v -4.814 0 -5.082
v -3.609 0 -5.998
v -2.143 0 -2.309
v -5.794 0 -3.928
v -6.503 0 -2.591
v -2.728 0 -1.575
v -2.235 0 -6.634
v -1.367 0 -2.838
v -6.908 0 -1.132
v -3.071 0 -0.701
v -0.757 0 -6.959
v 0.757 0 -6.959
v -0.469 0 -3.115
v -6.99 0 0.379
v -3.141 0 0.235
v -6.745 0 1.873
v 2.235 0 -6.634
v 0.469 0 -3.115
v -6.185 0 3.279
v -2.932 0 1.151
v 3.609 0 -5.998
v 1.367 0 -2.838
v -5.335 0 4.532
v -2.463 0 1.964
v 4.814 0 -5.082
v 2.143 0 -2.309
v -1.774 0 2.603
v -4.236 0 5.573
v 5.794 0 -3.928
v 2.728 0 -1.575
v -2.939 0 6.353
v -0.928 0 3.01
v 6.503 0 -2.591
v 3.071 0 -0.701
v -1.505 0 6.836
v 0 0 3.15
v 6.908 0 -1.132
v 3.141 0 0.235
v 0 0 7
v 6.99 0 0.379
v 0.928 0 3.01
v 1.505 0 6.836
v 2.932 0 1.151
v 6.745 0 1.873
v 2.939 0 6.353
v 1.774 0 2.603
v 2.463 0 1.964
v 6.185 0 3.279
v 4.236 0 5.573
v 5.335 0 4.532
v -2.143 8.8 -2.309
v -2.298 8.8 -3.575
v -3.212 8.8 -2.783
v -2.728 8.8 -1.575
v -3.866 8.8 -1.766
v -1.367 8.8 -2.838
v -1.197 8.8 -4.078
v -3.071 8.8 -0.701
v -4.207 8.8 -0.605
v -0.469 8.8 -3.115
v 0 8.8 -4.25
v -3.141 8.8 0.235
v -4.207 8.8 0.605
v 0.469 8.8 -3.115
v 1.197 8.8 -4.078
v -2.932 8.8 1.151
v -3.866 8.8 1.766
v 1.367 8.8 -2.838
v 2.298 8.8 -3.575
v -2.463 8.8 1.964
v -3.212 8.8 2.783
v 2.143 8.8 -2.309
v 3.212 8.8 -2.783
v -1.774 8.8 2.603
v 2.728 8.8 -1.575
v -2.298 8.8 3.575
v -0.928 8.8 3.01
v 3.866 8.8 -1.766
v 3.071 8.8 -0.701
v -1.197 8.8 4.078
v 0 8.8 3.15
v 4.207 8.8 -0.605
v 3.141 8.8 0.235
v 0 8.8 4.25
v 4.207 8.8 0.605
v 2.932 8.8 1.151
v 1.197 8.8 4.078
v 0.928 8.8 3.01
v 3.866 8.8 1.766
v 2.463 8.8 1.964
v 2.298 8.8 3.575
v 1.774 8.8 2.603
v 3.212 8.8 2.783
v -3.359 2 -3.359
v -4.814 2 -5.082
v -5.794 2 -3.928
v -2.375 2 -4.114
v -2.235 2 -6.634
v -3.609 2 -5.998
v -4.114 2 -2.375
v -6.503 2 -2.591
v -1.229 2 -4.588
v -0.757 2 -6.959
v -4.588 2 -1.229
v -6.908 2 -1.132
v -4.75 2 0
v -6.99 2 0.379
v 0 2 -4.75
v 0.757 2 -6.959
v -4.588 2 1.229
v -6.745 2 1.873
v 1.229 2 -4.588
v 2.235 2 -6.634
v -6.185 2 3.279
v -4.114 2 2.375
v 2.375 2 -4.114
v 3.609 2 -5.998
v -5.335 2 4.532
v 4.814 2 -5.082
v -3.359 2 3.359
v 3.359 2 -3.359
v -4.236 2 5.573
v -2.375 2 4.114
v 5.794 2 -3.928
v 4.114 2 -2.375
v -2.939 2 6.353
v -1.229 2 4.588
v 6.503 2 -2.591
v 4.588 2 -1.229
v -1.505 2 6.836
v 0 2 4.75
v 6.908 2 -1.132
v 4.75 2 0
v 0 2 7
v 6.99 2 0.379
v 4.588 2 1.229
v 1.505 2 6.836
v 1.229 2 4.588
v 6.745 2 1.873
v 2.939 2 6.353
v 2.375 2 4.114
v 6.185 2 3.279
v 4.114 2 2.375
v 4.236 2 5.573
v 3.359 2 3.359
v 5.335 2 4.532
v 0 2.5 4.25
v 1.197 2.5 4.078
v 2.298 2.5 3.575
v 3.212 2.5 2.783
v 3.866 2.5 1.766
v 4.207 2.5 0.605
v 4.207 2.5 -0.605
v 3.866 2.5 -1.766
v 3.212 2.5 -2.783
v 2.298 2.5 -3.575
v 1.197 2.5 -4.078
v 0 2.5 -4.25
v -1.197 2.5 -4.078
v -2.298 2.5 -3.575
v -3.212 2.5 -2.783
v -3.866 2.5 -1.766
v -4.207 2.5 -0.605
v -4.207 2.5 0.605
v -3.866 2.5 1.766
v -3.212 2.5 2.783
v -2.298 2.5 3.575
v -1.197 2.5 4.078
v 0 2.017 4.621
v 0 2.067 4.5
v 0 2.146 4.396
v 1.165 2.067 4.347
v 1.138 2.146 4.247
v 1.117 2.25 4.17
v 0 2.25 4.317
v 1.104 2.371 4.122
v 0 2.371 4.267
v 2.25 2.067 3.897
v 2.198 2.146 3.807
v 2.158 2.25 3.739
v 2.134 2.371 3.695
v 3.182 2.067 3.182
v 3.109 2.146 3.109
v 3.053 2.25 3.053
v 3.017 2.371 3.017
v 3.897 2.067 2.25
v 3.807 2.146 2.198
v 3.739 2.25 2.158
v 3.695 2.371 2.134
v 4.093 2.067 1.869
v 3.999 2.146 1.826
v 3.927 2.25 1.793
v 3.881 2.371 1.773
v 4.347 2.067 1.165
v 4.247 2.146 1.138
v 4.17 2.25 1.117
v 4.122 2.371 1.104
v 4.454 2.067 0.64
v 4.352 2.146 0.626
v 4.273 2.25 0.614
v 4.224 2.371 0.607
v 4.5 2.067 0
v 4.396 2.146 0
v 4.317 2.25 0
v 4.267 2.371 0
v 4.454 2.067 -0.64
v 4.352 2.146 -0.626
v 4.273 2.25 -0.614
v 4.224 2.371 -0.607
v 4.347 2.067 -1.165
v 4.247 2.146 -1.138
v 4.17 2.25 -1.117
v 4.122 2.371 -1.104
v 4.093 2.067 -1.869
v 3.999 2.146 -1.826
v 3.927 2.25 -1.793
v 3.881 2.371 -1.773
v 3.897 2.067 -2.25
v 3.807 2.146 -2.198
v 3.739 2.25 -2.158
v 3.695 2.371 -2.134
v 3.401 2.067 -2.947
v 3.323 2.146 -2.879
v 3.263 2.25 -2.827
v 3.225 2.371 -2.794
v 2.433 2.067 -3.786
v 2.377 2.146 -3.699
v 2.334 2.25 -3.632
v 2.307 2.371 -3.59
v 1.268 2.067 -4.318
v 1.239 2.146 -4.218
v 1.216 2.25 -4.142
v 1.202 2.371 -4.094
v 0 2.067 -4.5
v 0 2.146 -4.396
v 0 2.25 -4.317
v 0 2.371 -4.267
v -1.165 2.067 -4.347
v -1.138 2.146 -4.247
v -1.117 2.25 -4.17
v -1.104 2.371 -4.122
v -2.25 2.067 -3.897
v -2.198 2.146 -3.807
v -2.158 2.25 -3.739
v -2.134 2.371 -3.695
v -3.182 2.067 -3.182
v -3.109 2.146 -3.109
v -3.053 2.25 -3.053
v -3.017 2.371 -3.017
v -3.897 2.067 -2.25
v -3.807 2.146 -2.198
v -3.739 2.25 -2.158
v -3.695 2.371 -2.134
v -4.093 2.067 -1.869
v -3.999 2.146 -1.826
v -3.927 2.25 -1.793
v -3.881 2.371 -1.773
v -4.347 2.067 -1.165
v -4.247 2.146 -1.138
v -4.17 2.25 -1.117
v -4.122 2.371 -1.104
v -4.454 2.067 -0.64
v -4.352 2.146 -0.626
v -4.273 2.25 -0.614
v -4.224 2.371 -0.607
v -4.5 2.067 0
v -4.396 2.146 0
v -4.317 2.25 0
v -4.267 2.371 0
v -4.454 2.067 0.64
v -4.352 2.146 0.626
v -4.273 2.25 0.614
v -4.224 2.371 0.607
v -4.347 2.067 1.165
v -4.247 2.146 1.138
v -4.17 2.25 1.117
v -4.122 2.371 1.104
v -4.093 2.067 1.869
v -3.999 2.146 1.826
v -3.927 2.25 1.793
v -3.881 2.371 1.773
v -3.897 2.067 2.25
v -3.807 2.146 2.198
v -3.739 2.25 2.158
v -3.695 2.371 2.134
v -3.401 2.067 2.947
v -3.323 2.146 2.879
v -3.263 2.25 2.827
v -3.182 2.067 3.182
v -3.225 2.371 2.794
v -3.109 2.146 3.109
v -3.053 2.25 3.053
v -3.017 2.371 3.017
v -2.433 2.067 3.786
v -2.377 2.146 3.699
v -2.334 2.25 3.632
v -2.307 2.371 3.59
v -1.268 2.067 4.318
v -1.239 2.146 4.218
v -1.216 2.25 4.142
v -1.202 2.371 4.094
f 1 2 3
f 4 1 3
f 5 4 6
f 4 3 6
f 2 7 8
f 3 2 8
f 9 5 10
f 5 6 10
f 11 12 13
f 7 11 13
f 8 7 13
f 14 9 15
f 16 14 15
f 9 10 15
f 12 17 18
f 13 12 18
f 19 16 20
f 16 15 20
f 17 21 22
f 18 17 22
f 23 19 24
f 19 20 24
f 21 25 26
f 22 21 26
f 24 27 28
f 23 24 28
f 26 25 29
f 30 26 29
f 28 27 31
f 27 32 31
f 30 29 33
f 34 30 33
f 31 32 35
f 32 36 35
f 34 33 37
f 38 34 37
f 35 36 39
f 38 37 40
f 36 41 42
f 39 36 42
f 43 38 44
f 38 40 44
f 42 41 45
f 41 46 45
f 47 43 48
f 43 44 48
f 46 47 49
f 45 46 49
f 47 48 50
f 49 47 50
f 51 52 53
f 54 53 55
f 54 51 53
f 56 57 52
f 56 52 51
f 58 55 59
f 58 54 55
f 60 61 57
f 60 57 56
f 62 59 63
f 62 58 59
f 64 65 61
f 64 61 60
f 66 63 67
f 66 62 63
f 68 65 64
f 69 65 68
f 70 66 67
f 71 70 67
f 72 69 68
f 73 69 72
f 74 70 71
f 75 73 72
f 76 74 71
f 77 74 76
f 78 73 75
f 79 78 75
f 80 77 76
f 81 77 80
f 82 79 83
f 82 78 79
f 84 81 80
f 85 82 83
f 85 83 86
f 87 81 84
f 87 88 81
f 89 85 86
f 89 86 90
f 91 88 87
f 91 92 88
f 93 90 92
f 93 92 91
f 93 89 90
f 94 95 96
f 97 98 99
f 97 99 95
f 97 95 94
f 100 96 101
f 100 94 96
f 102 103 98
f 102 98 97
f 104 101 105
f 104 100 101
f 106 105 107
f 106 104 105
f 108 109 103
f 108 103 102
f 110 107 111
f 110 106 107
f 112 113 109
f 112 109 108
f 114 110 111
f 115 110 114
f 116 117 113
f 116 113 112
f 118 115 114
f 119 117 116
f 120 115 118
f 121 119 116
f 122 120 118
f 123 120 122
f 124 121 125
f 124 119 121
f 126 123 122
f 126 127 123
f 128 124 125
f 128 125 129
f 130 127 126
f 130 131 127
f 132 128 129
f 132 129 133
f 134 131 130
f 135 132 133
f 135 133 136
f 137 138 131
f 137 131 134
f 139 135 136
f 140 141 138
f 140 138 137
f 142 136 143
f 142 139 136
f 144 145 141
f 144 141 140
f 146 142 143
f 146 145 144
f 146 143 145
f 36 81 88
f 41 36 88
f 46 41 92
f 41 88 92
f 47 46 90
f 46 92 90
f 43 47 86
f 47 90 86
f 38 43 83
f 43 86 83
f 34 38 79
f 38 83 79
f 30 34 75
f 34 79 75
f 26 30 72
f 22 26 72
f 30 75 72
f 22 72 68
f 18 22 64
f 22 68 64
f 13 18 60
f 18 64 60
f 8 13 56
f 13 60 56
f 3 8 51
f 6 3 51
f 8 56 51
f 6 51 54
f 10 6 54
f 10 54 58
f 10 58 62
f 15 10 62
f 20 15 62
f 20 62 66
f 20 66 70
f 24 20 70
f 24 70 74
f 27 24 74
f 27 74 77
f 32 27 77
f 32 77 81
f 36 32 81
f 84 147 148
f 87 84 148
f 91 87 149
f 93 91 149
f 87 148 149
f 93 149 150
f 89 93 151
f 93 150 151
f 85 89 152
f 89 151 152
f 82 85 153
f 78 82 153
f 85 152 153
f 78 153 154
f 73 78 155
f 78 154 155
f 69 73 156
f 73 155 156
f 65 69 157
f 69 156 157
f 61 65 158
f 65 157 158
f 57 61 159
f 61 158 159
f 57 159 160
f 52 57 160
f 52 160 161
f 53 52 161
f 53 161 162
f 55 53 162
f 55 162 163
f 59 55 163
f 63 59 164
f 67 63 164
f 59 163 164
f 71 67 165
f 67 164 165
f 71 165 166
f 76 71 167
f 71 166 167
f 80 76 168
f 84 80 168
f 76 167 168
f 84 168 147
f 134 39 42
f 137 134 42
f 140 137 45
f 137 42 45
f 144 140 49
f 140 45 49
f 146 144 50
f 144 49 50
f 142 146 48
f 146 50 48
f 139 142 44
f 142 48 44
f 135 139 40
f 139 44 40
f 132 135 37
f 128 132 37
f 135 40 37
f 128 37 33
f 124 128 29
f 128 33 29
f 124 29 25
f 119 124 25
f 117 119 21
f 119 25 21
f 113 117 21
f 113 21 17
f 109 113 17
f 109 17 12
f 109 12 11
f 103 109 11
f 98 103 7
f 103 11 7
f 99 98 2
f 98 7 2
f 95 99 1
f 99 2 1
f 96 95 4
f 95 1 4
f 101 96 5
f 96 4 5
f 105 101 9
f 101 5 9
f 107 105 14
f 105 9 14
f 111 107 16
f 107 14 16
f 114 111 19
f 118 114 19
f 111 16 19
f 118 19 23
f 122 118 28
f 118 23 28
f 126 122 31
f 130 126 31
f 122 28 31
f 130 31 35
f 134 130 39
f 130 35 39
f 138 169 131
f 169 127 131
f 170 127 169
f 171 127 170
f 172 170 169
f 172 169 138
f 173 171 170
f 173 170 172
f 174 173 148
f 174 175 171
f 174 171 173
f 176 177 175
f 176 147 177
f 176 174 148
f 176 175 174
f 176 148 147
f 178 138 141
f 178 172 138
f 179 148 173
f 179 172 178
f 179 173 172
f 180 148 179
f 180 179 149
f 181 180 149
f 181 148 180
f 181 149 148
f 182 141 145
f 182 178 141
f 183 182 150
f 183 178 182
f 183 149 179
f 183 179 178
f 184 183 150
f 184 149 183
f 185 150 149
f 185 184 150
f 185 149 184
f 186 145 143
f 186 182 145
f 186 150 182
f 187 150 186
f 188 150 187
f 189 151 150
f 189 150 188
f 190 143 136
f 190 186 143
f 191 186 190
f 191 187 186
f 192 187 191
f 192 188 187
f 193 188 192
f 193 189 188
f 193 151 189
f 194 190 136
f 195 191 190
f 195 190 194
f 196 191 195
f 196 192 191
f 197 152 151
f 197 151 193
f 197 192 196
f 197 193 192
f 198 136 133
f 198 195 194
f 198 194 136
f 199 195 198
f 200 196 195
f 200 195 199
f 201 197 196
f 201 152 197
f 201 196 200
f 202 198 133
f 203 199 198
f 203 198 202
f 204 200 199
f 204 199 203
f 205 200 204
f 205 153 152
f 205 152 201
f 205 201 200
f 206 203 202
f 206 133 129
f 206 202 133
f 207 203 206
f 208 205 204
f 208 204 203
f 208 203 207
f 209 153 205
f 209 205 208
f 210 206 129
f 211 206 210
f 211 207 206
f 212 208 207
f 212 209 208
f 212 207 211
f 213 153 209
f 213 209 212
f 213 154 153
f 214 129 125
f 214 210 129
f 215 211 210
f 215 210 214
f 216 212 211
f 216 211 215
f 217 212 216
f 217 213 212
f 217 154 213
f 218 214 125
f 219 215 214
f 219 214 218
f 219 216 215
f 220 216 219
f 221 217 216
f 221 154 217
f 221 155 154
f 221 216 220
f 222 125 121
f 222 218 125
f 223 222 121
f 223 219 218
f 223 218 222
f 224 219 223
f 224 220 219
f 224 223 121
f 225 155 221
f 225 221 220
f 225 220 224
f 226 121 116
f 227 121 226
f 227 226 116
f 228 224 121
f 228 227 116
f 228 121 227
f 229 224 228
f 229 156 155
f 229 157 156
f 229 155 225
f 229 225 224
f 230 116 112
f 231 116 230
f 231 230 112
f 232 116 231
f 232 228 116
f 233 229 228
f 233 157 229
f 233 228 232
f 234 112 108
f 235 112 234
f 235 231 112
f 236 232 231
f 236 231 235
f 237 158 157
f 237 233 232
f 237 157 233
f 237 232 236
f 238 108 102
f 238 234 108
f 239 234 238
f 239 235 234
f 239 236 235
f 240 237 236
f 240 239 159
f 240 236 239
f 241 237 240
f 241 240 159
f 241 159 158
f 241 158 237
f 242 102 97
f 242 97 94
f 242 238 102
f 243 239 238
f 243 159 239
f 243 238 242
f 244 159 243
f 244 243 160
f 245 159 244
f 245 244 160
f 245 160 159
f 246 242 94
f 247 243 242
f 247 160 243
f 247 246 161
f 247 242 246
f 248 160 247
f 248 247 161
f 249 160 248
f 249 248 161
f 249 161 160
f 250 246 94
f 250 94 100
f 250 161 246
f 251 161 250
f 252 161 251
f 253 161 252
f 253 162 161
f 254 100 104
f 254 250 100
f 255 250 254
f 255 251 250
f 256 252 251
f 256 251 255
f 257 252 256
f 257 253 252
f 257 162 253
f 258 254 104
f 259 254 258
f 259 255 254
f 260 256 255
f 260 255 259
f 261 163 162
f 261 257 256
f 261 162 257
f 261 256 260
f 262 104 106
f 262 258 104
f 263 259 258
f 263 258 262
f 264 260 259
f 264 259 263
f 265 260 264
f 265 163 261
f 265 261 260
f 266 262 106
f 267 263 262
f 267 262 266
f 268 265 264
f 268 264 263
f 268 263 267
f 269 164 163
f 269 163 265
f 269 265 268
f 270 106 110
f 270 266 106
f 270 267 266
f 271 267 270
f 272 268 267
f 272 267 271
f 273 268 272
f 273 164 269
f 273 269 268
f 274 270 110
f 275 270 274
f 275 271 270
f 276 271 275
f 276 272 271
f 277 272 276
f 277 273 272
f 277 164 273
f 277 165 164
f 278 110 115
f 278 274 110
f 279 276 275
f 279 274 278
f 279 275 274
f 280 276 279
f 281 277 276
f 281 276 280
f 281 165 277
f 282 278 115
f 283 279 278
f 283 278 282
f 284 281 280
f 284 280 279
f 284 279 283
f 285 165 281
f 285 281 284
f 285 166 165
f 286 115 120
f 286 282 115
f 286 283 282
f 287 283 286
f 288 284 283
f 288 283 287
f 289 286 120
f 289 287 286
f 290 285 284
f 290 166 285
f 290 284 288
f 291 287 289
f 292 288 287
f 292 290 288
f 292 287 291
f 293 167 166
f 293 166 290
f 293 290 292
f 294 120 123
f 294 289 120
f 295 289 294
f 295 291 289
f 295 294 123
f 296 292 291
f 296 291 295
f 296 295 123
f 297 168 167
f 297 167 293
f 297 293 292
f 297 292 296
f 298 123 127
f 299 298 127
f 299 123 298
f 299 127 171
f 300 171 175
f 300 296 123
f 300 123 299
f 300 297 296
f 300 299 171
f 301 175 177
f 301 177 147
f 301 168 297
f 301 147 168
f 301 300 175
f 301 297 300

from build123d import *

# Parameters (mm, degrees)
SKETCH_1_R          = 7
EXTRUDE_1_DEPTH     = 2
SKETCH_2_R          = 4.25
EXTRUDE_2_DEPTH     = 6.8
CUT_EXTRUDE_1_REACH = 15.245
SKETCH_3_R          = 3.15
FILLET_1_R          = 0.5


with BuildPart() as part:
    # 草图1 → 凸台-拉伸1 (new body)
    with BuildSketch(Plane(origin=(0, 0, 0), x_dir=(1, 0, 0), z_dir=(0, 1, 0))):
        with Locations(Location((0, 0, 0), (0, 0, 270))):
            Circle(SKETCH_1_R)
    extrude(amount=EXTRUDE_1_DEPTH)

    # 草图2 → 凸台-拉伸2 (add)
    with BuildSketch(Plane(origin=(0, 2, 0), x_dir=(1, 0, 0), z_dir=(0, 1, 0))):
        with Locations(Location((0, 0, 0), (0, 0, 270))):
            Circle(SKETCH_2_R)
    extrude(amount=EXTRUDE_2_DEPTH)

    # 草图3 → 切除-拉伸1 (cut, up to next)
    with BuildSketch(Plane(origin=(0, 8.8, 0), x_dir=(1, 0, 0), z_dir=(0, 1, 0)), mode=Mode.PRIVATE) as cut_extrude_1_sk1:
        with Locations(Location((0, 0, 0), (0, 0, 270))):
            Circle(SKETCH_3_R)
    cut_extrude_1_tool1 = extrude(cut_extrude_1_sk1.sketch, amount=-CUT_EXTRUDE_1_REACH, mode=Mode.PRIVATE) & part.part
    add(cut_extrude_1_tool1.solids().sort_by_distance((0, 8.8, 0))[0], mode=Mode.SUBTRACT)

    # 圆角1
    fillet_1_edges = [part.edges().sort_by_distance(p)[0] for p in [
        (0, 2, -4.25),
    ]]
    fillet(fillet_1_edges, radius=FILLET_1_R)


solid = part.part
